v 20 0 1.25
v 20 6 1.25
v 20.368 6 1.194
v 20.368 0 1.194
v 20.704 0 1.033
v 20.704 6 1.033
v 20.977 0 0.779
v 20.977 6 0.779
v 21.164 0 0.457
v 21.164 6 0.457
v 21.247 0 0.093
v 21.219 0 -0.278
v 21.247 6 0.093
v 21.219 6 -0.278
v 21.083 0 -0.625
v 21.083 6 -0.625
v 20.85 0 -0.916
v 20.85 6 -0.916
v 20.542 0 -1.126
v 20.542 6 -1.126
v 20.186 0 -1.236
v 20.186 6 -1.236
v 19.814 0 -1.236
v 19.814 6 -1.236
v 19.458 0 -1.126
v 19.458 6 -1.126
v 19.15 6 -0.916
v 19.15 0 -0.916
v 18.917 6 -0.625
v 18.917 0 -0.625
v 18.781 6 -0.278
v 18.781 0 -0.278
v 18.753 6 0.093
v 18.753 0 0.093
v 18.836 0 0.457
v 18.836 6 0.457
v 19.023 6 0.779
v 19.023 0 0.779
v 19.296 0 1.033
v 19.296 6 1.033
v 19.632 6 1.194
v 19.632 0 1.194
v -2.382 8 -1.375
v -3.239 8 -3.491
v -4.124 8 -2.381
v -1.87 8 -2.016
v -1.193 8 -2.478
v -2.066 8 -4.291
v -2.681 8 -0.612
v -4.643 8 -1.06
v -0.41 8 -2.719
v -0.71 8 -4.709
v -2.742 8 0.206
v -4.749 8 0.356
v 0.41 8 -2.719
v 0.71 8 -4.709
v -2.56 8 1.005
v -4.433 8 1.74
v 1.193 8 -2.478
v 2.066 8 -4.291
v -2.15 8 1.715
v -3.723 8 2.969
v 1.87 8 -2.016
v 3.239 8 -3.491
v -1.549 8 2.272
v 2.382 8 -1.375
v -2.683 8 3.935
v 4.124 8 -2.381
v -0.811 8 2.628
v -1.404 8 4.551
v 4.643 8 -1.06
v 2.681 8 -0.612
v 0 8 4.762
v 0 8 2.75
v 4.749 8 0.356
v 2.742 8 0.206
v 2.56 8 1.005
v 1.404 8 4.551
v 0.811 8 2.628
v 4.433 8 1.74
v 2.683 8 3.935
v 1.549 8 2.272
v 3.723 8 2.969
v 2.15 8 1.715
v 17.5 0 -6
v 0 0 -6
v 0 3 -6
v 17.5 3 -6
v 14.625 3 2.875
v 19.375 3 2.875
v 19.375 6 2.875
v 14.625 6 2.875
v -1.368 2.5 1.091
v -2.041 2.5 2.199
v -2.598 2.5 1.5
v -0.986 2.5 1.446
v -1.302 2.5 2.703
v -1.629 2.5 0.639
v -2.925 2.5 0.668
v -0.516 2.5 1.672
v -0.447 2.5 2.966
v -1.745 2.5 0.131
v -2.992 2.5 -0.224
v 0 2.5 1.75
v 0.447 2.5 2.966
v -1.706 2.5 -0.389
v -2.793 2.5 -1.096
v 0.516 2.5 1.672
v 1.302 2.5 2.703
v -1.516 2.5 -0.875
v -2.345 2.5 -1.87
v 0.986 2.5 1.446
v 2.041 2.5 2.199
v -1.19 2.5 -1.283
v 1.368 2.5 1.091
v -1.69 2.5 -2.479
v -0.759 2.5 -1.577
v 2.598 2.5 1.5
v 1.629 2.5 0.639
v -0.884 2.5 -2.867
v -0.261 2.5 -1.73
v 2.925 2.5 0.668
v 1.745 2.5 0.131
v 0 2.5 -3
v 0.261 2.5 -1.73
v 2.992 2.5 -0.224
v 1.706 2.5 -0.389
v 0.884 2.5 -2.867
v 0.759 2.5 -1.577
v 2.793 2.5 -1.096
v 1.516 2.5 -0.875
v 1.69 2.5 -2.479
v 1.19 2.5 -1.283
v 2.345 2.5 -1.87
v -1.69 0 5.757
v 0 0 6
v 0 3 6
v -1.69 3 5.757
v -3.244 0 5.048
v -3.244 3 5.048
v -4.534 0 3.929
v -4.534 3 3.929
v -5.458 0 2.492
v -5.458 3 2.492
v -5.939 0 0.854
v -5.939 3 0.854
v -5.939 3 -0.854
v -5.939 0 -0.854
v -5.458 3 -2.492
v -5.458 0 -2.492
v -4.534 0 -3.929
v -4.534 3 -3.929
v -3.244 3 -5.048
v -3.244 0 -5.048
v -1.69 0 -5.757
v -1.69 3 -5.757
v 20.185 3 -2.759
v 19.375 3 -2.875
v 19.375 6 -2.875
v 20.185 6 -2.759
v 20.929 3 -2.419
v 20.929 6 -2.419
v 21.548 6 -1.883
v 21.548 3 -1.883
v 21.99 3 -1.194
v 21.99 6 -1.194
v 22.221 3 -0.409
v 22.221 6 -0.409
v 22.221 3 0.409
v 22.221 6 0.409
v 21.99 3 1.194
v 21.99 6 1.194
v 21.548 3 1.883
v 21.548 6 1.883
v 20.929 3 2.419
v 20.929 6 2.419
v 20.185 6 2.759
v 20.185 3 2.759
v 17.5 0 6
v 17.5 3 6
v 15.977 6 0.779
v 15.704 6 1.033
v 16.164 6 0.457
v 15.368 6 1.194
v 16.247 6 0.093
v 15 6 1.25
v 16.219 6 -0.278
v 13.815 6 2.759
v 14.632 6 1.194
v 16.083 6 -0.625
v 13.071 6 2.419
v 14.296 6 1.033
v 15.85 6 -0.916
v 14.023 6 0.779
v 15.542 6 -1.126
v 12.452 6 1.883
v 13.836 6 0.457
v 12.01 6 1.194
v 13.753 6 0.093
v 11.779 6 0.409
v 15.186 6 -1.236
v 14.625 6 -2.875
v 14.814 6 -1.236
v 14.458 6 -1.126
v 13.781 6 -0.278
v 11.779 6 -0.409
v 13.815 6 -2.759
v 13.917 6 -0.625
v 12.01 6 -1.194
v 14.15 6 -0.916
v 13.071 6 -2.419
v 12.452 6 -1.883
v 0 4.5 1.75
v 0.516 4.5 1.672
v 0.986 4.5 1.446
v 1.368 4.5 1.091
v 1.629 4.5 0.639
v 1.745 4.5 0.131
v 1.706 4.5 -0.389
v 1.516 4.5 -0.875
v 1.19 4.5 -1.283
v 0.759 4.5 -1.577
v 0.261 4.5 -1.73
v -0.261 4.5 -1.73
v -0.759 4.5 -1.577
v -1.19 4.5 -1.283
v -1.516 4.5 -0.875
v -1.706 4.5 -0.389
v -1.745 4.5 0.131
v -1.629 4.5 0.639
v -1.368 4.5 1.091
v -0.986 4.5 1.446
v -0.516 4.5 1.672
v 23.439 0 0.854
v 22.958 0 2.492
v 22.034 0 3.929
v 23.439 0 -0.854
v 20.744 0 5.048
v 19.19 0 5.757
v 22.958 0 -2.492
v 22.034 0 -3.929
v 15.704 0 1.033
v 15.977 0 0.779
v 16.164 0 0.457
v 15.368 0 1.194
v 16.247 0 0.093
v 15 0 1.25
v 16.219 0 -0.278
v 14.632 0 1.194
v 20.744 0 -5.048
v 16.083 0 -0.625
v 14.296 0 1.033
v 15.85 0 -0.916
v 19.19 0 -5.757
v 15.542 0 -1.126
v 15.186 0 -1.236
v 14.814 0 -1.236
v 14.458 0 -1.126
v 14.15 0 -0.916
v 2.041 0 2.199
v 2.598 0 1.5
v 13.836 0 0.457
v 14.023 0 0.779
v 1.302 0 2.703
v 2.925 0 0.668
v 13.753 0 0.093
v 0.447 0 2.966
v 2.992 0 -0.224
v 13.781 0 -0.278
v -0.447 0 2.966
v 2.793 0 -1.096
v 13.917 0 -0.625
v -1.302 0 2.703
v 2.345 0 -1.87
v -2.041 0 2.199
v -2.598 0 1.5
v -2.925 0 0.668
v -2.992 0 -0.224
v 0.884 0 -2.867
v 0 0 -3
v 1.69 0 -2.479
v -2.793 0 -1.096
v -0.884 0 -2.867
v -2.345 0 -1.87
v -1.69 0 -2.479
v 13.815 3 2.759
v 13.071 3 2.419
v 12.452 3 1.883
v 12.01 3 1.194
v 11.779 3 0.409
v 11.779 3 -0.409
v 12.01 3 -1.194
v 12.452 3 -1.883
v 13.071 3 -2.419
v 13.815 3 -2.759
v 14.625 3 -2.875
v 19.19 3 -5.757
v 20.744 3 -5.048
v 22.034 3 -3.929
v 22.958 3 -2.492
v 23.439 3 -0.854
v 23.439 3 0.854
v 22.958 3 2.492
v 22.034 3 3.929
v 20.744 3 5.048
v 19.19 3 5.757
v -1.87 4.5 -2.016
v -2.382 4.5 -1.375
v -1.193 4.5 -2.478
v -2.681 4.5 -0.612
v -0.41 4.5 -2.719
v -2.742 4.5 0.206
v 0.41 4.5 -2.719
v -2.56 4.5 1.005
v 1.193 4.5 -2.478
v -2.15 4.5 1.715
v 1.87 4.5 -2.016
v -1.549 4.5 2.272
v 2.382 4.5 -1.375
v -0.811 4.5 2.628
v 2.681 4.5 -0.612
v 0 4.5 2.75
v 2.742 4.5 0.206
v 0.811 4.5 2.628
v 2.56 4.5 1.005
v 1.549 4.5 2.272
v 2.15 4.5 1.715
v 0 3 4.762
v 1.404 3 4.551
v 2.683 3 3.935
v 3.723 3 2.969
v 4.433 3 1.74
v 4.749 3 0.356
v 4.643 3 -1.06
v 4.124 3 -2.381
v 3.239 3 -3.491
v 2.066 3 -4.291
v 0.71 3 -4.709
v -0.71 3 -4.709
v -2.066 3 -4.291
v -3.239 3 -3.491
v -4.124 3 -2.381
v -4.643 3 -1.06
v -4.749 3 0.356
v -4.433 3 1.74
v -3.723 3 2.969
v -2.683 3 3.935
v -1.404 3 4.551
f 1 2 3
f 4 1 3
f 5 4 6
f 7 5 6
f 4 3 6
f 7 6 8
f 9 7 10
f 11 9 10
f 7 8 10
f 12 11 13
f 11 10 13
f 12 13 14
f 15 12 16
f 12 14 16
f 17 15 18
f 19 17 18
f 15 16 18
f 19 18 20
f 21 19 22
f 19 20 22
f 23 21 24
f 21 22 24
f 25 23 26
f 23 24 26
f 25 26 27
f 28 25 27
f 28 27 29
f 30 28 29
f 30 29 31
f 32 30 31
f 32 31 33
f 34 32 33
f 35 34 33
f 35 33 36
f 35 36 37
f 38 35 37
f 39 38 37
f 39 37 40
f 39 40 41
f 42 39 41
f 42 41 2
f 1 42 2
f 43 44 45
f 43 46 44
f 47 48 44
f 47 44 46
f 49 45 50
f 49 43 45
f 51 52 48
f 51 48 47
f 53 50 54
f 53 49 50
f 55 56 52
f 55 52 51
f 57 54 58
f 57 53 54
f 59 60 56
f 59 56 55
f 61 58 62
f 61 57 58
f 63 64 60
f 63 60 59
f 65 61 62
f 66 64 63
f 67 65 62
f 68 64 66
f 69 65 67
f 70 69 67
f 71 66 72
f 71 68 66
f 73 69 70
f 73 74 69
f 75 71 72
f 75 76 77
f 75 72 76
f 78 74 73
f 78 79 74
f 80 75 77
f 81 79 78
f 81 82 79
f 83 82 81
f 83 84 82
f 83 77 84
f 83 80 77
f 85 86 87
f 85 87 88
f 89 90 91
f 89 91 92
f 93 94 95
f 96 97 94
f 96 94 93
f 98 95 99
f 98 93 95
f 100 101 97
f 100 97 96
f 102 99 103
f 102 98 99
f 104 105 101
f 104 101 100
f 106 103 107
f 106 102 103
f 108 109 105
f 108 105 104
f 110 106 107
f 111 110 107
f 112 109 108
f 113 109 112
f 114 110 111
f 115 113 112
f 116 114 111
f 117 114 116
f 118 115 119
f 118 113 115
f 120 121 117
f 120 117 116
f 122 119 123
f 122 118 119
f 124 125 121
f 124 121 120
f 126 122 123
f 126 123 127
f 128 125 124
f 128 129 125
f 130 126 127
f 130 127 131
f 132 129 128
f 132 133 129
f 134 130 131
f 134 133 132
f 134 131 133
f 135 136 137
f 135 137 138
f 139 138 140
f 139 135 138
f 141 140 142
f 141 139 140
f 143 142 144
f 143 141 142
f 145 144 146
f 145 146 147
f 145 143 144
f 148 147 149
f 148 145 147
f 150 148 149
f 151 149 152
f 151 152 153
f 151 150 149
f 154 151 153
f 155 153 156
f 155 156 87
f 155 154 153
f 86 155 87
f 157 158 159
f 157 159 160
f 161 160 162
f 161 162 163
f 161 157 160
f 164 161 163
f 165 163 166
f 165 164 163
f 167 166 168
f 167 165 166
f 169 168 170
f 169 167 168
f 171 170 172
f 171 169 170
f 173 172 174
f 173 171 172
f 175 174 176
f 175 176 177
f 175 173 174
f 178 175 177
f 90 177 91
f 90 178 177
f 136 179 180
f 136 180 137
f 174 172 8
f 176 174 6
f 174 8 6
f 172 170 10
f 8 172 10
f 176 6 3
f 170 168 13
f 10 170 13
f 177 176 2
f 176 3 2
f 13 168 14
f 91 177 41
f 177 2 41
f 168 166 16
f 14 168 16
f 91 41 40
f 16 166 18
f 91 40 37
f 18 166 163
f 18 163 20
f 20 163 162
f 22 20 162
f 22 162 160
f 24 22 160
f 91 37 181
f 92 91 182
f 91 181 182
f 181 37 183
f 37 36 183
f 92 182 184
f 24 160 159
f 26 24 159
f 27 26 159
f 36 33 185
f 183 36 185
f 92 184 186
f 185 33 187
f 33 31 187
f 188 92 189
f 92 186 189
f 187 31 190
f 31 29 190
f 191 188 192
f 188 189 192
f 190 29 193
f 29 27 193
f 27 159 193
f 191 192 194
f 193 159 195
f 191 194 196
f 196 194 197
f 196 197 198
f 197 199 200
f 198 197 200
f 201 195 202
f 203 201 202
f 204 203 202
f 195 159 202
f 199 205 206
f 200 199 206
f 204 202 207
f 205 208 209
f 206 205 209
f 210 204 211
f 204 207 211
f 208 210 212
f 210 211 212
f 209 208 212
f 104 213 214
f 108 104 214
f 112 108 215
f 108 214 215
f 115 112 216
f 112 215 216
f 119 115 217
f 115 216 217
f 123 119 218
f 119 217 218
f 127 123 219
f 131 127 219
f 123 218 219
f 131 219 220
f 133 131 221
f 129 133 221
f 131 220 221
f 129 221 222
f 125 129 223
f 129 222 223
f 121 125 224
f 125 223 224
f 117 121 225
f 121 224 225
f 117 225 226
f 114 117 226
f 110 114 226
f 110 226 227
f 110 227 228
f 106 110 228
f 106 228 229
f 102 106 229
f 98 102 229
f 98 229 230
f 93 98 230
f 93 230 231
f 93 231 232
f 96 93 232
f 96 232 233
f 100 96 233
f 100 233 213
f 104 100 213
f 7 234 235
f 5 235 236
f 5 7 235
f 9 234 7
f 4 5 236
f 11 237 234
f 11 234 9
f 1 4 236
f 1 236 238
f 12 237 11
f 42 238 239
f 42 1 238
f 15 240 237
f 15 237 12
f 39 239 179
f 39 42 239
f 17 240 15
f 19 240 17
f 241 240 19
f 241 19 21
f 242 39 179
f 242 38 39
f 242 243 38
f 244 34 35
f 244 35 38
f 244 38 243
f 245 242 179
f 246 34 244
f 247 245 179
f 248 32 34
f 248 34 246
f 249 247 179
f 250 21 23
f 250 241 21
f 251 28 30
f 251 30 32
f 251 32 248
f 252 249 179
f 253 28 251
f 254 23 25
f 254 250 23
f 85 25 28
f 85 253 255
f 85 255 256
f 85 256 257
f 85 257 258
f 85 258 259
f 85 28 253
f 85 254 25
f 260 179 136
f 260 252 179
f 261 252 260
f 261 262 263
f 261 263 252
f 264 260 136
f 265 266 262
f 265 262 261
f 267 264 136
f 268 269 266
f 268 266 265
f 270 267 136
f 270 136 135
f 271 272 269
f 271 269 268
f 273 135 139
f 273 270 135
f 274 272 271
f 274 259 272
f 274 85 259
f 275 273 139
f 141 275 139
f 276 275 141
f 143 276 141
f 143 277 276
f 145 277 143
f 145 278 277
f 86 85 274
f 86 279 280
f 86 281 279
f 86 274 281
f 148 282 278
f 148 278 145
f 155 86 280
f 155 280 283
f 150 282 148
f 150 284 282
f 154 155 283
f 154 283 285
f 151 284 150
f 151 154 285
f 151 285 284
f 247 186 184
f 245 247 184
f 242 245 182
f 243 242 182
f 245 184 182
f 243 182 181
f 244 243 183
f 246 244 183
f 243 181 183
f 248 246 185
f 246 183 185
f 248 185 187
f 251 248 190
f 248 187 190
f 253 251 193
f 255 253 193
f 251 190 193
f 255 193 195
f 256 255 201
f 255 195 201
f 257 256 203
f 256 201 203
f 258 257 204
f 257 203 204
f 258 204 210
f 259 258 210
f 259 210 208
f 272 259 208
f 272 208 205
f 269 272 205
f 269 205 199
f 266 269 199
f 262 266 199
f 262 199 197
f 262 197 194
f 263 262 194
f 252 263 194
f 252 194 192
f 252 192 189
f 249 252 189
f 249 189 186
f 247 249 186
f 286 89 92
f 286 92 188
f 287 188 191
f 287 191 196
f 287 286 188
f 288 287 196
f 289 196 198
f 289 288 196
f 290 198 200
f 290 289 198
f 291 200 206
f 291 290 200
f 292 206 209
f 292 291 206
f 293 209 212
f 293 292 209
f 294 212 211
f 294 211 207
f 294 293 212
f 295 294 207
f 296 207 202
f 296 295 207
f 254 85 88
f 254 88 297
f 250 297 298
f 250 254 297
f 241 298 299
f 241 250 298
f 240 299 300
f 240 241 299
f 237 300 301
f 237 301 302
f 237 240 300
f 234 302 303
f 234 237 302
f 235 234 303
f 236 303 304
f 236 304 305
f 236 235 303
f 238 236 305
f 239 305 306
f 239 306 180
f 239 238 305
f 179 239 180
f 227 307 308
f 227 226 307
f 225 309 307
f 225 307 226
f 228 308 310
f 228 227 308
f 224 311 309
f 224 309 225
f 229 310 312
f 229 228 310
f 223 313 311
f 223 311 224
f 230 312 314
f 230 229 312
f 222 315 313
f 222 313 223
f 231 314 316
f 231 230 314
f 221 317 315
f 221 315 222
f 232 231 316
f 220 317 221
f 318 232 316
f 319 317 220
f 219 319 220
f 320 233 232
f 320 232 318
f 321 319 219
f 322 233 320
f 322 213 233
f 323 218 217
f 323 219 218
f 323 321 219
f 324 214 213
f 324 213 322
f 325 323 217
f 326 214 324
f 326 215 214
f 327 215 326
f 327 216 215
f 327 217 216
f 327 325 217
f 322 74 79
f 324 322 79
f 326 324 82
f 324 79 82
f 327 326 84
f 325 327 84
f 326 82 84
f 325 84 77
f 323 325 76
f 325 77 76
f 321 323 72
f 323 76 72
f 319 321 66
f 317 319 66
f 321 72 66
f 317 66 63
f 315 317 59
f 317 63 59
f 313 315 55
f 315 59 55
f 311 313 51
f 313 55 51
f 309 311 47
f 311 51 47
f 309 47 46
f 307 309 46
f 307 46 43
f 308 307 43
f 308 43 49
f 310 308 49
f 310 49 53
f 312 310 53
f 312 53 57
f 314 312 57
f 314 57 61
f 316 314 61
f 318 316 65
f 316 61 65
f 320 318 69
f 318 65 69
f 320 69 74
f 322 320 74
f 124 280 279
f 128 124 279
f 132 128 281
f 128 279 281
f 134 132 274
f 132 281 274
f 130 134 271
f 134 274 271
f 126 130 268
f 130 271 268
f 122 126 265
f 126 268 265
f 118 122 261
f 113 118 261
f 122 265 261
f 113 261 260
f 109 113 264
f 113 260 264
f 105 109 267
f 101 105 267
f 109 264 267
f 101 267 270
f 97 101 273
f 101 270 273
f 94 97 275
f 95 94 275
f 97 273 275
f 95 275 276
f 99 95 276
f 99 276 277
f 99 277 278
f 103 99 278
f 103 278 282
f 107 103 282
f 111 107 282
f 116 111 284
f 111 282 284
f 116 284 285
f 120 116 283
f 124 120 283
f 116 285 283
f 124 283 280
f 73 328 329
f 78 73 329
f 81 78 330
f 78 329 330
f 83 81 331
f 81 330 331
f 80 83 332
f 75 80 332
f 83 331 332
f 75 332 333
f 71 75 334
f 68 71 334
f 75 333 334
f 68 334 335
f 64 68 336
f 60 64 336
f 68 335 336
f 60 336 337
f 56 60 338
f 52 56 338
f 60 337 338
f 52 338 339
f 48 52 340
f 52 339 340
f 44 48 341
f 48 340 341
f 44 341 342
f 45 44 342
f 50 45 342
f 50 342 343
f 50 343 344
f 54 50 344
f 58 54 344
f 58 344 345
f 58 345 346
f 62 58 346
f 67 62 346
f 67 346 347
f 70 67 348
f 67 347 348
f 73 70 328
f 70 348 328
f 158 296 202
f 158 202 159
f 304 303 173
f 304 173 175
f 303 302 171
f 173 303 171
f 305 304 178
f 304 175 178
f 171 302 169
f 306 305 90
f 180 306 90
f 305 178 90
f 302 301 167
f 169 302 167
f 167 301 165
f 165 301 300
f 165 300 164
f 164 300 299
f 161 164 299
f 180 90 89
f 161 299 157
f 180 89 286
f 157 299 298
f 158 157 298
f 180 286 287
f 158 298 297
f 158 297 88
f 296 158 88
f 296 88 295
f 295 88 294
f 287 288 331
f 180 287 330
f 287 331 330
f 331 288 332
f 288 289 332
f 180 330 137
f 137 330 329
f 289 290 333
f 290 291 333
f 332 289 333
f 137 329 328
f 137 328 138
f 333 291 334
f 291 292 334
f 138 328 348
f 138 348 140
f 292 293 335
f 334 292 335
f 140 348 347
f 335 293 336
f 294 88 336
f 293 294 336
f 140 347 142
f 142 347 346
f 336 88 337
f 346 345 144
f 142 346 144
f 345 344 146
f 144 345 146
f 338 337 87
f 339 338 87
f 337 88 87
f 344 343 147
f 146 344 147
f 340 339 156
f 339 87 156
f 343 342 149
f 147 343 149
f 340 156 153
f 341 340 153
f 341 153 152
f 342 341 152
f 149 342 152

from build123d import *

# Parameters (mm, degrees)
BOSS_EXTRUDE1_DEPTH = 3
SKETCH2_R           = 4.7625
BOSS_EXTRUDE2_DEPTH = 5
BOSS_EXTRUDE3_DEPTH = 3
SKETCH4_R           = 2.75
CUT_EXTRUDE1_DEPTH  = 3.5
SKETCH5_R           = 1.25
CUT_EXTRUDE2_DEPTH  = 25.984995497
SKETCH6_R           = 1.75
CUT_EXTRUDE3_DEPTH  = 25.667792767
SKETCH7_R           = 3
CUT_EXTRUDE4_DEPTH  = 2.5


with BuildPart() as part:
    # Sketch1 → Boss-Extrude1 (new body)
    with BuildSketch(Plane(origin=(0, 0, 0), x_dir=(1, 0, 0), z_dir=(0, 1, 0))):
        with BuildLine():
            Line((0, 6), (17.5, 6))
            ThreePointArc((17.5, 6), (23.5, 0), (17.5, -6))
            Line((17.5, -6), (0, -6))
            ThreePointArc((0, -6), (-6, 0), (0, 6))
        make_face()
    extrude(amount=BOSS_EXTRUDE1_DEPTH)

    # Sketch2 → Boss-Extrude2 (add)
    with BuildSketch(Plane(origin=(0, 3, 0), x_dir=(1, 0, 0), z_dir=(0, 1, 0))):
        with Locations(Location((0, 0, 0), (0, 0, 270))):
            Circle(SKETCH2_R)
    extrude(amount=BOSS_EXTRUDE2_DEPTH)

    # Sketch3 → Boss-Extrude3 (add)
    with BuildSketch(Plane(origin=(0, 3, 0), x_dir=(1, 0, 0), z_dir=(0, 1, 0))):
        with BuildLine():
            Line((19.375, -2.875), (14.625, -2.875))
            ThreePointArc((14.625, -2.875), (11.75, 0), (14.625, 2.875))
            Line((14.625, 2.875), (19.375, 2.875))
            ThreePointArc((19.375, 2.875), (22.25, 0), (19.375, -2.875))
        make_face()
    extrude(amount=BOSS_EXTRUDE3_DEPTH)

    # Sketch4 → Cut-Extrude1 (cut)
    with BuildSketch(Plane(origin=(0, 8, 0), x_dir=(1, 0, 0), z_dir=(0, 1, 0))):
        with Locations(Location((0, 0, 0), (0, 0, 270))):
            Circle(SKETCH4_R)
    extrude(amount=-CUT_EXTRUDE1_DEPTH, mode=Mode.SUBTRACT)

    # Sketch5 → Cut-Extrude2 (cut, through all)
    with BuildSketch(Plane(origin=(0, 6, 0), x_dir=(1, 0, 0), z_dir=(0, 1, 0))):
        with Locations(Location((20, 0, 0), (0, 0, 270))):
            Circle(SKETCH5_R)
        with Locations(Location((15, 0, 0), (0, 0, 270))):
            Circle(SKETCH5_R)
    extrude(amount=-CUT_EXTRUDE2_DEPTH, mode=Mode.SUBTRACT)

    # Sketch6 → Cut-Extrude3 (cut, through all)
    with BuildSketch(Plane(origin=(0, 4.5, 0), x_dir=(1, 0, 0), z_dir=(0, 1, 0))):
        with Locations(Location((0, 0, 0), (0, 0, 270))):
            Circle(SKETCH6_R)
    extrude(amount=-CUT_EXTRUDE3_DEPTH, mode=Mode.SUBTRACT)

    # Sketch7 → Cut-Extrude4 (cut)
    with BuildSketch(Plane.XZ):
        with Locations(Location((0, 0, 0), (0, 0, 270))):
            Circle(SKETCH7_R)
    extrude(amount=-CUT_EXTRUDE4_DEPTH, mode=Mode.SUBTRACT)


solid = part.part
